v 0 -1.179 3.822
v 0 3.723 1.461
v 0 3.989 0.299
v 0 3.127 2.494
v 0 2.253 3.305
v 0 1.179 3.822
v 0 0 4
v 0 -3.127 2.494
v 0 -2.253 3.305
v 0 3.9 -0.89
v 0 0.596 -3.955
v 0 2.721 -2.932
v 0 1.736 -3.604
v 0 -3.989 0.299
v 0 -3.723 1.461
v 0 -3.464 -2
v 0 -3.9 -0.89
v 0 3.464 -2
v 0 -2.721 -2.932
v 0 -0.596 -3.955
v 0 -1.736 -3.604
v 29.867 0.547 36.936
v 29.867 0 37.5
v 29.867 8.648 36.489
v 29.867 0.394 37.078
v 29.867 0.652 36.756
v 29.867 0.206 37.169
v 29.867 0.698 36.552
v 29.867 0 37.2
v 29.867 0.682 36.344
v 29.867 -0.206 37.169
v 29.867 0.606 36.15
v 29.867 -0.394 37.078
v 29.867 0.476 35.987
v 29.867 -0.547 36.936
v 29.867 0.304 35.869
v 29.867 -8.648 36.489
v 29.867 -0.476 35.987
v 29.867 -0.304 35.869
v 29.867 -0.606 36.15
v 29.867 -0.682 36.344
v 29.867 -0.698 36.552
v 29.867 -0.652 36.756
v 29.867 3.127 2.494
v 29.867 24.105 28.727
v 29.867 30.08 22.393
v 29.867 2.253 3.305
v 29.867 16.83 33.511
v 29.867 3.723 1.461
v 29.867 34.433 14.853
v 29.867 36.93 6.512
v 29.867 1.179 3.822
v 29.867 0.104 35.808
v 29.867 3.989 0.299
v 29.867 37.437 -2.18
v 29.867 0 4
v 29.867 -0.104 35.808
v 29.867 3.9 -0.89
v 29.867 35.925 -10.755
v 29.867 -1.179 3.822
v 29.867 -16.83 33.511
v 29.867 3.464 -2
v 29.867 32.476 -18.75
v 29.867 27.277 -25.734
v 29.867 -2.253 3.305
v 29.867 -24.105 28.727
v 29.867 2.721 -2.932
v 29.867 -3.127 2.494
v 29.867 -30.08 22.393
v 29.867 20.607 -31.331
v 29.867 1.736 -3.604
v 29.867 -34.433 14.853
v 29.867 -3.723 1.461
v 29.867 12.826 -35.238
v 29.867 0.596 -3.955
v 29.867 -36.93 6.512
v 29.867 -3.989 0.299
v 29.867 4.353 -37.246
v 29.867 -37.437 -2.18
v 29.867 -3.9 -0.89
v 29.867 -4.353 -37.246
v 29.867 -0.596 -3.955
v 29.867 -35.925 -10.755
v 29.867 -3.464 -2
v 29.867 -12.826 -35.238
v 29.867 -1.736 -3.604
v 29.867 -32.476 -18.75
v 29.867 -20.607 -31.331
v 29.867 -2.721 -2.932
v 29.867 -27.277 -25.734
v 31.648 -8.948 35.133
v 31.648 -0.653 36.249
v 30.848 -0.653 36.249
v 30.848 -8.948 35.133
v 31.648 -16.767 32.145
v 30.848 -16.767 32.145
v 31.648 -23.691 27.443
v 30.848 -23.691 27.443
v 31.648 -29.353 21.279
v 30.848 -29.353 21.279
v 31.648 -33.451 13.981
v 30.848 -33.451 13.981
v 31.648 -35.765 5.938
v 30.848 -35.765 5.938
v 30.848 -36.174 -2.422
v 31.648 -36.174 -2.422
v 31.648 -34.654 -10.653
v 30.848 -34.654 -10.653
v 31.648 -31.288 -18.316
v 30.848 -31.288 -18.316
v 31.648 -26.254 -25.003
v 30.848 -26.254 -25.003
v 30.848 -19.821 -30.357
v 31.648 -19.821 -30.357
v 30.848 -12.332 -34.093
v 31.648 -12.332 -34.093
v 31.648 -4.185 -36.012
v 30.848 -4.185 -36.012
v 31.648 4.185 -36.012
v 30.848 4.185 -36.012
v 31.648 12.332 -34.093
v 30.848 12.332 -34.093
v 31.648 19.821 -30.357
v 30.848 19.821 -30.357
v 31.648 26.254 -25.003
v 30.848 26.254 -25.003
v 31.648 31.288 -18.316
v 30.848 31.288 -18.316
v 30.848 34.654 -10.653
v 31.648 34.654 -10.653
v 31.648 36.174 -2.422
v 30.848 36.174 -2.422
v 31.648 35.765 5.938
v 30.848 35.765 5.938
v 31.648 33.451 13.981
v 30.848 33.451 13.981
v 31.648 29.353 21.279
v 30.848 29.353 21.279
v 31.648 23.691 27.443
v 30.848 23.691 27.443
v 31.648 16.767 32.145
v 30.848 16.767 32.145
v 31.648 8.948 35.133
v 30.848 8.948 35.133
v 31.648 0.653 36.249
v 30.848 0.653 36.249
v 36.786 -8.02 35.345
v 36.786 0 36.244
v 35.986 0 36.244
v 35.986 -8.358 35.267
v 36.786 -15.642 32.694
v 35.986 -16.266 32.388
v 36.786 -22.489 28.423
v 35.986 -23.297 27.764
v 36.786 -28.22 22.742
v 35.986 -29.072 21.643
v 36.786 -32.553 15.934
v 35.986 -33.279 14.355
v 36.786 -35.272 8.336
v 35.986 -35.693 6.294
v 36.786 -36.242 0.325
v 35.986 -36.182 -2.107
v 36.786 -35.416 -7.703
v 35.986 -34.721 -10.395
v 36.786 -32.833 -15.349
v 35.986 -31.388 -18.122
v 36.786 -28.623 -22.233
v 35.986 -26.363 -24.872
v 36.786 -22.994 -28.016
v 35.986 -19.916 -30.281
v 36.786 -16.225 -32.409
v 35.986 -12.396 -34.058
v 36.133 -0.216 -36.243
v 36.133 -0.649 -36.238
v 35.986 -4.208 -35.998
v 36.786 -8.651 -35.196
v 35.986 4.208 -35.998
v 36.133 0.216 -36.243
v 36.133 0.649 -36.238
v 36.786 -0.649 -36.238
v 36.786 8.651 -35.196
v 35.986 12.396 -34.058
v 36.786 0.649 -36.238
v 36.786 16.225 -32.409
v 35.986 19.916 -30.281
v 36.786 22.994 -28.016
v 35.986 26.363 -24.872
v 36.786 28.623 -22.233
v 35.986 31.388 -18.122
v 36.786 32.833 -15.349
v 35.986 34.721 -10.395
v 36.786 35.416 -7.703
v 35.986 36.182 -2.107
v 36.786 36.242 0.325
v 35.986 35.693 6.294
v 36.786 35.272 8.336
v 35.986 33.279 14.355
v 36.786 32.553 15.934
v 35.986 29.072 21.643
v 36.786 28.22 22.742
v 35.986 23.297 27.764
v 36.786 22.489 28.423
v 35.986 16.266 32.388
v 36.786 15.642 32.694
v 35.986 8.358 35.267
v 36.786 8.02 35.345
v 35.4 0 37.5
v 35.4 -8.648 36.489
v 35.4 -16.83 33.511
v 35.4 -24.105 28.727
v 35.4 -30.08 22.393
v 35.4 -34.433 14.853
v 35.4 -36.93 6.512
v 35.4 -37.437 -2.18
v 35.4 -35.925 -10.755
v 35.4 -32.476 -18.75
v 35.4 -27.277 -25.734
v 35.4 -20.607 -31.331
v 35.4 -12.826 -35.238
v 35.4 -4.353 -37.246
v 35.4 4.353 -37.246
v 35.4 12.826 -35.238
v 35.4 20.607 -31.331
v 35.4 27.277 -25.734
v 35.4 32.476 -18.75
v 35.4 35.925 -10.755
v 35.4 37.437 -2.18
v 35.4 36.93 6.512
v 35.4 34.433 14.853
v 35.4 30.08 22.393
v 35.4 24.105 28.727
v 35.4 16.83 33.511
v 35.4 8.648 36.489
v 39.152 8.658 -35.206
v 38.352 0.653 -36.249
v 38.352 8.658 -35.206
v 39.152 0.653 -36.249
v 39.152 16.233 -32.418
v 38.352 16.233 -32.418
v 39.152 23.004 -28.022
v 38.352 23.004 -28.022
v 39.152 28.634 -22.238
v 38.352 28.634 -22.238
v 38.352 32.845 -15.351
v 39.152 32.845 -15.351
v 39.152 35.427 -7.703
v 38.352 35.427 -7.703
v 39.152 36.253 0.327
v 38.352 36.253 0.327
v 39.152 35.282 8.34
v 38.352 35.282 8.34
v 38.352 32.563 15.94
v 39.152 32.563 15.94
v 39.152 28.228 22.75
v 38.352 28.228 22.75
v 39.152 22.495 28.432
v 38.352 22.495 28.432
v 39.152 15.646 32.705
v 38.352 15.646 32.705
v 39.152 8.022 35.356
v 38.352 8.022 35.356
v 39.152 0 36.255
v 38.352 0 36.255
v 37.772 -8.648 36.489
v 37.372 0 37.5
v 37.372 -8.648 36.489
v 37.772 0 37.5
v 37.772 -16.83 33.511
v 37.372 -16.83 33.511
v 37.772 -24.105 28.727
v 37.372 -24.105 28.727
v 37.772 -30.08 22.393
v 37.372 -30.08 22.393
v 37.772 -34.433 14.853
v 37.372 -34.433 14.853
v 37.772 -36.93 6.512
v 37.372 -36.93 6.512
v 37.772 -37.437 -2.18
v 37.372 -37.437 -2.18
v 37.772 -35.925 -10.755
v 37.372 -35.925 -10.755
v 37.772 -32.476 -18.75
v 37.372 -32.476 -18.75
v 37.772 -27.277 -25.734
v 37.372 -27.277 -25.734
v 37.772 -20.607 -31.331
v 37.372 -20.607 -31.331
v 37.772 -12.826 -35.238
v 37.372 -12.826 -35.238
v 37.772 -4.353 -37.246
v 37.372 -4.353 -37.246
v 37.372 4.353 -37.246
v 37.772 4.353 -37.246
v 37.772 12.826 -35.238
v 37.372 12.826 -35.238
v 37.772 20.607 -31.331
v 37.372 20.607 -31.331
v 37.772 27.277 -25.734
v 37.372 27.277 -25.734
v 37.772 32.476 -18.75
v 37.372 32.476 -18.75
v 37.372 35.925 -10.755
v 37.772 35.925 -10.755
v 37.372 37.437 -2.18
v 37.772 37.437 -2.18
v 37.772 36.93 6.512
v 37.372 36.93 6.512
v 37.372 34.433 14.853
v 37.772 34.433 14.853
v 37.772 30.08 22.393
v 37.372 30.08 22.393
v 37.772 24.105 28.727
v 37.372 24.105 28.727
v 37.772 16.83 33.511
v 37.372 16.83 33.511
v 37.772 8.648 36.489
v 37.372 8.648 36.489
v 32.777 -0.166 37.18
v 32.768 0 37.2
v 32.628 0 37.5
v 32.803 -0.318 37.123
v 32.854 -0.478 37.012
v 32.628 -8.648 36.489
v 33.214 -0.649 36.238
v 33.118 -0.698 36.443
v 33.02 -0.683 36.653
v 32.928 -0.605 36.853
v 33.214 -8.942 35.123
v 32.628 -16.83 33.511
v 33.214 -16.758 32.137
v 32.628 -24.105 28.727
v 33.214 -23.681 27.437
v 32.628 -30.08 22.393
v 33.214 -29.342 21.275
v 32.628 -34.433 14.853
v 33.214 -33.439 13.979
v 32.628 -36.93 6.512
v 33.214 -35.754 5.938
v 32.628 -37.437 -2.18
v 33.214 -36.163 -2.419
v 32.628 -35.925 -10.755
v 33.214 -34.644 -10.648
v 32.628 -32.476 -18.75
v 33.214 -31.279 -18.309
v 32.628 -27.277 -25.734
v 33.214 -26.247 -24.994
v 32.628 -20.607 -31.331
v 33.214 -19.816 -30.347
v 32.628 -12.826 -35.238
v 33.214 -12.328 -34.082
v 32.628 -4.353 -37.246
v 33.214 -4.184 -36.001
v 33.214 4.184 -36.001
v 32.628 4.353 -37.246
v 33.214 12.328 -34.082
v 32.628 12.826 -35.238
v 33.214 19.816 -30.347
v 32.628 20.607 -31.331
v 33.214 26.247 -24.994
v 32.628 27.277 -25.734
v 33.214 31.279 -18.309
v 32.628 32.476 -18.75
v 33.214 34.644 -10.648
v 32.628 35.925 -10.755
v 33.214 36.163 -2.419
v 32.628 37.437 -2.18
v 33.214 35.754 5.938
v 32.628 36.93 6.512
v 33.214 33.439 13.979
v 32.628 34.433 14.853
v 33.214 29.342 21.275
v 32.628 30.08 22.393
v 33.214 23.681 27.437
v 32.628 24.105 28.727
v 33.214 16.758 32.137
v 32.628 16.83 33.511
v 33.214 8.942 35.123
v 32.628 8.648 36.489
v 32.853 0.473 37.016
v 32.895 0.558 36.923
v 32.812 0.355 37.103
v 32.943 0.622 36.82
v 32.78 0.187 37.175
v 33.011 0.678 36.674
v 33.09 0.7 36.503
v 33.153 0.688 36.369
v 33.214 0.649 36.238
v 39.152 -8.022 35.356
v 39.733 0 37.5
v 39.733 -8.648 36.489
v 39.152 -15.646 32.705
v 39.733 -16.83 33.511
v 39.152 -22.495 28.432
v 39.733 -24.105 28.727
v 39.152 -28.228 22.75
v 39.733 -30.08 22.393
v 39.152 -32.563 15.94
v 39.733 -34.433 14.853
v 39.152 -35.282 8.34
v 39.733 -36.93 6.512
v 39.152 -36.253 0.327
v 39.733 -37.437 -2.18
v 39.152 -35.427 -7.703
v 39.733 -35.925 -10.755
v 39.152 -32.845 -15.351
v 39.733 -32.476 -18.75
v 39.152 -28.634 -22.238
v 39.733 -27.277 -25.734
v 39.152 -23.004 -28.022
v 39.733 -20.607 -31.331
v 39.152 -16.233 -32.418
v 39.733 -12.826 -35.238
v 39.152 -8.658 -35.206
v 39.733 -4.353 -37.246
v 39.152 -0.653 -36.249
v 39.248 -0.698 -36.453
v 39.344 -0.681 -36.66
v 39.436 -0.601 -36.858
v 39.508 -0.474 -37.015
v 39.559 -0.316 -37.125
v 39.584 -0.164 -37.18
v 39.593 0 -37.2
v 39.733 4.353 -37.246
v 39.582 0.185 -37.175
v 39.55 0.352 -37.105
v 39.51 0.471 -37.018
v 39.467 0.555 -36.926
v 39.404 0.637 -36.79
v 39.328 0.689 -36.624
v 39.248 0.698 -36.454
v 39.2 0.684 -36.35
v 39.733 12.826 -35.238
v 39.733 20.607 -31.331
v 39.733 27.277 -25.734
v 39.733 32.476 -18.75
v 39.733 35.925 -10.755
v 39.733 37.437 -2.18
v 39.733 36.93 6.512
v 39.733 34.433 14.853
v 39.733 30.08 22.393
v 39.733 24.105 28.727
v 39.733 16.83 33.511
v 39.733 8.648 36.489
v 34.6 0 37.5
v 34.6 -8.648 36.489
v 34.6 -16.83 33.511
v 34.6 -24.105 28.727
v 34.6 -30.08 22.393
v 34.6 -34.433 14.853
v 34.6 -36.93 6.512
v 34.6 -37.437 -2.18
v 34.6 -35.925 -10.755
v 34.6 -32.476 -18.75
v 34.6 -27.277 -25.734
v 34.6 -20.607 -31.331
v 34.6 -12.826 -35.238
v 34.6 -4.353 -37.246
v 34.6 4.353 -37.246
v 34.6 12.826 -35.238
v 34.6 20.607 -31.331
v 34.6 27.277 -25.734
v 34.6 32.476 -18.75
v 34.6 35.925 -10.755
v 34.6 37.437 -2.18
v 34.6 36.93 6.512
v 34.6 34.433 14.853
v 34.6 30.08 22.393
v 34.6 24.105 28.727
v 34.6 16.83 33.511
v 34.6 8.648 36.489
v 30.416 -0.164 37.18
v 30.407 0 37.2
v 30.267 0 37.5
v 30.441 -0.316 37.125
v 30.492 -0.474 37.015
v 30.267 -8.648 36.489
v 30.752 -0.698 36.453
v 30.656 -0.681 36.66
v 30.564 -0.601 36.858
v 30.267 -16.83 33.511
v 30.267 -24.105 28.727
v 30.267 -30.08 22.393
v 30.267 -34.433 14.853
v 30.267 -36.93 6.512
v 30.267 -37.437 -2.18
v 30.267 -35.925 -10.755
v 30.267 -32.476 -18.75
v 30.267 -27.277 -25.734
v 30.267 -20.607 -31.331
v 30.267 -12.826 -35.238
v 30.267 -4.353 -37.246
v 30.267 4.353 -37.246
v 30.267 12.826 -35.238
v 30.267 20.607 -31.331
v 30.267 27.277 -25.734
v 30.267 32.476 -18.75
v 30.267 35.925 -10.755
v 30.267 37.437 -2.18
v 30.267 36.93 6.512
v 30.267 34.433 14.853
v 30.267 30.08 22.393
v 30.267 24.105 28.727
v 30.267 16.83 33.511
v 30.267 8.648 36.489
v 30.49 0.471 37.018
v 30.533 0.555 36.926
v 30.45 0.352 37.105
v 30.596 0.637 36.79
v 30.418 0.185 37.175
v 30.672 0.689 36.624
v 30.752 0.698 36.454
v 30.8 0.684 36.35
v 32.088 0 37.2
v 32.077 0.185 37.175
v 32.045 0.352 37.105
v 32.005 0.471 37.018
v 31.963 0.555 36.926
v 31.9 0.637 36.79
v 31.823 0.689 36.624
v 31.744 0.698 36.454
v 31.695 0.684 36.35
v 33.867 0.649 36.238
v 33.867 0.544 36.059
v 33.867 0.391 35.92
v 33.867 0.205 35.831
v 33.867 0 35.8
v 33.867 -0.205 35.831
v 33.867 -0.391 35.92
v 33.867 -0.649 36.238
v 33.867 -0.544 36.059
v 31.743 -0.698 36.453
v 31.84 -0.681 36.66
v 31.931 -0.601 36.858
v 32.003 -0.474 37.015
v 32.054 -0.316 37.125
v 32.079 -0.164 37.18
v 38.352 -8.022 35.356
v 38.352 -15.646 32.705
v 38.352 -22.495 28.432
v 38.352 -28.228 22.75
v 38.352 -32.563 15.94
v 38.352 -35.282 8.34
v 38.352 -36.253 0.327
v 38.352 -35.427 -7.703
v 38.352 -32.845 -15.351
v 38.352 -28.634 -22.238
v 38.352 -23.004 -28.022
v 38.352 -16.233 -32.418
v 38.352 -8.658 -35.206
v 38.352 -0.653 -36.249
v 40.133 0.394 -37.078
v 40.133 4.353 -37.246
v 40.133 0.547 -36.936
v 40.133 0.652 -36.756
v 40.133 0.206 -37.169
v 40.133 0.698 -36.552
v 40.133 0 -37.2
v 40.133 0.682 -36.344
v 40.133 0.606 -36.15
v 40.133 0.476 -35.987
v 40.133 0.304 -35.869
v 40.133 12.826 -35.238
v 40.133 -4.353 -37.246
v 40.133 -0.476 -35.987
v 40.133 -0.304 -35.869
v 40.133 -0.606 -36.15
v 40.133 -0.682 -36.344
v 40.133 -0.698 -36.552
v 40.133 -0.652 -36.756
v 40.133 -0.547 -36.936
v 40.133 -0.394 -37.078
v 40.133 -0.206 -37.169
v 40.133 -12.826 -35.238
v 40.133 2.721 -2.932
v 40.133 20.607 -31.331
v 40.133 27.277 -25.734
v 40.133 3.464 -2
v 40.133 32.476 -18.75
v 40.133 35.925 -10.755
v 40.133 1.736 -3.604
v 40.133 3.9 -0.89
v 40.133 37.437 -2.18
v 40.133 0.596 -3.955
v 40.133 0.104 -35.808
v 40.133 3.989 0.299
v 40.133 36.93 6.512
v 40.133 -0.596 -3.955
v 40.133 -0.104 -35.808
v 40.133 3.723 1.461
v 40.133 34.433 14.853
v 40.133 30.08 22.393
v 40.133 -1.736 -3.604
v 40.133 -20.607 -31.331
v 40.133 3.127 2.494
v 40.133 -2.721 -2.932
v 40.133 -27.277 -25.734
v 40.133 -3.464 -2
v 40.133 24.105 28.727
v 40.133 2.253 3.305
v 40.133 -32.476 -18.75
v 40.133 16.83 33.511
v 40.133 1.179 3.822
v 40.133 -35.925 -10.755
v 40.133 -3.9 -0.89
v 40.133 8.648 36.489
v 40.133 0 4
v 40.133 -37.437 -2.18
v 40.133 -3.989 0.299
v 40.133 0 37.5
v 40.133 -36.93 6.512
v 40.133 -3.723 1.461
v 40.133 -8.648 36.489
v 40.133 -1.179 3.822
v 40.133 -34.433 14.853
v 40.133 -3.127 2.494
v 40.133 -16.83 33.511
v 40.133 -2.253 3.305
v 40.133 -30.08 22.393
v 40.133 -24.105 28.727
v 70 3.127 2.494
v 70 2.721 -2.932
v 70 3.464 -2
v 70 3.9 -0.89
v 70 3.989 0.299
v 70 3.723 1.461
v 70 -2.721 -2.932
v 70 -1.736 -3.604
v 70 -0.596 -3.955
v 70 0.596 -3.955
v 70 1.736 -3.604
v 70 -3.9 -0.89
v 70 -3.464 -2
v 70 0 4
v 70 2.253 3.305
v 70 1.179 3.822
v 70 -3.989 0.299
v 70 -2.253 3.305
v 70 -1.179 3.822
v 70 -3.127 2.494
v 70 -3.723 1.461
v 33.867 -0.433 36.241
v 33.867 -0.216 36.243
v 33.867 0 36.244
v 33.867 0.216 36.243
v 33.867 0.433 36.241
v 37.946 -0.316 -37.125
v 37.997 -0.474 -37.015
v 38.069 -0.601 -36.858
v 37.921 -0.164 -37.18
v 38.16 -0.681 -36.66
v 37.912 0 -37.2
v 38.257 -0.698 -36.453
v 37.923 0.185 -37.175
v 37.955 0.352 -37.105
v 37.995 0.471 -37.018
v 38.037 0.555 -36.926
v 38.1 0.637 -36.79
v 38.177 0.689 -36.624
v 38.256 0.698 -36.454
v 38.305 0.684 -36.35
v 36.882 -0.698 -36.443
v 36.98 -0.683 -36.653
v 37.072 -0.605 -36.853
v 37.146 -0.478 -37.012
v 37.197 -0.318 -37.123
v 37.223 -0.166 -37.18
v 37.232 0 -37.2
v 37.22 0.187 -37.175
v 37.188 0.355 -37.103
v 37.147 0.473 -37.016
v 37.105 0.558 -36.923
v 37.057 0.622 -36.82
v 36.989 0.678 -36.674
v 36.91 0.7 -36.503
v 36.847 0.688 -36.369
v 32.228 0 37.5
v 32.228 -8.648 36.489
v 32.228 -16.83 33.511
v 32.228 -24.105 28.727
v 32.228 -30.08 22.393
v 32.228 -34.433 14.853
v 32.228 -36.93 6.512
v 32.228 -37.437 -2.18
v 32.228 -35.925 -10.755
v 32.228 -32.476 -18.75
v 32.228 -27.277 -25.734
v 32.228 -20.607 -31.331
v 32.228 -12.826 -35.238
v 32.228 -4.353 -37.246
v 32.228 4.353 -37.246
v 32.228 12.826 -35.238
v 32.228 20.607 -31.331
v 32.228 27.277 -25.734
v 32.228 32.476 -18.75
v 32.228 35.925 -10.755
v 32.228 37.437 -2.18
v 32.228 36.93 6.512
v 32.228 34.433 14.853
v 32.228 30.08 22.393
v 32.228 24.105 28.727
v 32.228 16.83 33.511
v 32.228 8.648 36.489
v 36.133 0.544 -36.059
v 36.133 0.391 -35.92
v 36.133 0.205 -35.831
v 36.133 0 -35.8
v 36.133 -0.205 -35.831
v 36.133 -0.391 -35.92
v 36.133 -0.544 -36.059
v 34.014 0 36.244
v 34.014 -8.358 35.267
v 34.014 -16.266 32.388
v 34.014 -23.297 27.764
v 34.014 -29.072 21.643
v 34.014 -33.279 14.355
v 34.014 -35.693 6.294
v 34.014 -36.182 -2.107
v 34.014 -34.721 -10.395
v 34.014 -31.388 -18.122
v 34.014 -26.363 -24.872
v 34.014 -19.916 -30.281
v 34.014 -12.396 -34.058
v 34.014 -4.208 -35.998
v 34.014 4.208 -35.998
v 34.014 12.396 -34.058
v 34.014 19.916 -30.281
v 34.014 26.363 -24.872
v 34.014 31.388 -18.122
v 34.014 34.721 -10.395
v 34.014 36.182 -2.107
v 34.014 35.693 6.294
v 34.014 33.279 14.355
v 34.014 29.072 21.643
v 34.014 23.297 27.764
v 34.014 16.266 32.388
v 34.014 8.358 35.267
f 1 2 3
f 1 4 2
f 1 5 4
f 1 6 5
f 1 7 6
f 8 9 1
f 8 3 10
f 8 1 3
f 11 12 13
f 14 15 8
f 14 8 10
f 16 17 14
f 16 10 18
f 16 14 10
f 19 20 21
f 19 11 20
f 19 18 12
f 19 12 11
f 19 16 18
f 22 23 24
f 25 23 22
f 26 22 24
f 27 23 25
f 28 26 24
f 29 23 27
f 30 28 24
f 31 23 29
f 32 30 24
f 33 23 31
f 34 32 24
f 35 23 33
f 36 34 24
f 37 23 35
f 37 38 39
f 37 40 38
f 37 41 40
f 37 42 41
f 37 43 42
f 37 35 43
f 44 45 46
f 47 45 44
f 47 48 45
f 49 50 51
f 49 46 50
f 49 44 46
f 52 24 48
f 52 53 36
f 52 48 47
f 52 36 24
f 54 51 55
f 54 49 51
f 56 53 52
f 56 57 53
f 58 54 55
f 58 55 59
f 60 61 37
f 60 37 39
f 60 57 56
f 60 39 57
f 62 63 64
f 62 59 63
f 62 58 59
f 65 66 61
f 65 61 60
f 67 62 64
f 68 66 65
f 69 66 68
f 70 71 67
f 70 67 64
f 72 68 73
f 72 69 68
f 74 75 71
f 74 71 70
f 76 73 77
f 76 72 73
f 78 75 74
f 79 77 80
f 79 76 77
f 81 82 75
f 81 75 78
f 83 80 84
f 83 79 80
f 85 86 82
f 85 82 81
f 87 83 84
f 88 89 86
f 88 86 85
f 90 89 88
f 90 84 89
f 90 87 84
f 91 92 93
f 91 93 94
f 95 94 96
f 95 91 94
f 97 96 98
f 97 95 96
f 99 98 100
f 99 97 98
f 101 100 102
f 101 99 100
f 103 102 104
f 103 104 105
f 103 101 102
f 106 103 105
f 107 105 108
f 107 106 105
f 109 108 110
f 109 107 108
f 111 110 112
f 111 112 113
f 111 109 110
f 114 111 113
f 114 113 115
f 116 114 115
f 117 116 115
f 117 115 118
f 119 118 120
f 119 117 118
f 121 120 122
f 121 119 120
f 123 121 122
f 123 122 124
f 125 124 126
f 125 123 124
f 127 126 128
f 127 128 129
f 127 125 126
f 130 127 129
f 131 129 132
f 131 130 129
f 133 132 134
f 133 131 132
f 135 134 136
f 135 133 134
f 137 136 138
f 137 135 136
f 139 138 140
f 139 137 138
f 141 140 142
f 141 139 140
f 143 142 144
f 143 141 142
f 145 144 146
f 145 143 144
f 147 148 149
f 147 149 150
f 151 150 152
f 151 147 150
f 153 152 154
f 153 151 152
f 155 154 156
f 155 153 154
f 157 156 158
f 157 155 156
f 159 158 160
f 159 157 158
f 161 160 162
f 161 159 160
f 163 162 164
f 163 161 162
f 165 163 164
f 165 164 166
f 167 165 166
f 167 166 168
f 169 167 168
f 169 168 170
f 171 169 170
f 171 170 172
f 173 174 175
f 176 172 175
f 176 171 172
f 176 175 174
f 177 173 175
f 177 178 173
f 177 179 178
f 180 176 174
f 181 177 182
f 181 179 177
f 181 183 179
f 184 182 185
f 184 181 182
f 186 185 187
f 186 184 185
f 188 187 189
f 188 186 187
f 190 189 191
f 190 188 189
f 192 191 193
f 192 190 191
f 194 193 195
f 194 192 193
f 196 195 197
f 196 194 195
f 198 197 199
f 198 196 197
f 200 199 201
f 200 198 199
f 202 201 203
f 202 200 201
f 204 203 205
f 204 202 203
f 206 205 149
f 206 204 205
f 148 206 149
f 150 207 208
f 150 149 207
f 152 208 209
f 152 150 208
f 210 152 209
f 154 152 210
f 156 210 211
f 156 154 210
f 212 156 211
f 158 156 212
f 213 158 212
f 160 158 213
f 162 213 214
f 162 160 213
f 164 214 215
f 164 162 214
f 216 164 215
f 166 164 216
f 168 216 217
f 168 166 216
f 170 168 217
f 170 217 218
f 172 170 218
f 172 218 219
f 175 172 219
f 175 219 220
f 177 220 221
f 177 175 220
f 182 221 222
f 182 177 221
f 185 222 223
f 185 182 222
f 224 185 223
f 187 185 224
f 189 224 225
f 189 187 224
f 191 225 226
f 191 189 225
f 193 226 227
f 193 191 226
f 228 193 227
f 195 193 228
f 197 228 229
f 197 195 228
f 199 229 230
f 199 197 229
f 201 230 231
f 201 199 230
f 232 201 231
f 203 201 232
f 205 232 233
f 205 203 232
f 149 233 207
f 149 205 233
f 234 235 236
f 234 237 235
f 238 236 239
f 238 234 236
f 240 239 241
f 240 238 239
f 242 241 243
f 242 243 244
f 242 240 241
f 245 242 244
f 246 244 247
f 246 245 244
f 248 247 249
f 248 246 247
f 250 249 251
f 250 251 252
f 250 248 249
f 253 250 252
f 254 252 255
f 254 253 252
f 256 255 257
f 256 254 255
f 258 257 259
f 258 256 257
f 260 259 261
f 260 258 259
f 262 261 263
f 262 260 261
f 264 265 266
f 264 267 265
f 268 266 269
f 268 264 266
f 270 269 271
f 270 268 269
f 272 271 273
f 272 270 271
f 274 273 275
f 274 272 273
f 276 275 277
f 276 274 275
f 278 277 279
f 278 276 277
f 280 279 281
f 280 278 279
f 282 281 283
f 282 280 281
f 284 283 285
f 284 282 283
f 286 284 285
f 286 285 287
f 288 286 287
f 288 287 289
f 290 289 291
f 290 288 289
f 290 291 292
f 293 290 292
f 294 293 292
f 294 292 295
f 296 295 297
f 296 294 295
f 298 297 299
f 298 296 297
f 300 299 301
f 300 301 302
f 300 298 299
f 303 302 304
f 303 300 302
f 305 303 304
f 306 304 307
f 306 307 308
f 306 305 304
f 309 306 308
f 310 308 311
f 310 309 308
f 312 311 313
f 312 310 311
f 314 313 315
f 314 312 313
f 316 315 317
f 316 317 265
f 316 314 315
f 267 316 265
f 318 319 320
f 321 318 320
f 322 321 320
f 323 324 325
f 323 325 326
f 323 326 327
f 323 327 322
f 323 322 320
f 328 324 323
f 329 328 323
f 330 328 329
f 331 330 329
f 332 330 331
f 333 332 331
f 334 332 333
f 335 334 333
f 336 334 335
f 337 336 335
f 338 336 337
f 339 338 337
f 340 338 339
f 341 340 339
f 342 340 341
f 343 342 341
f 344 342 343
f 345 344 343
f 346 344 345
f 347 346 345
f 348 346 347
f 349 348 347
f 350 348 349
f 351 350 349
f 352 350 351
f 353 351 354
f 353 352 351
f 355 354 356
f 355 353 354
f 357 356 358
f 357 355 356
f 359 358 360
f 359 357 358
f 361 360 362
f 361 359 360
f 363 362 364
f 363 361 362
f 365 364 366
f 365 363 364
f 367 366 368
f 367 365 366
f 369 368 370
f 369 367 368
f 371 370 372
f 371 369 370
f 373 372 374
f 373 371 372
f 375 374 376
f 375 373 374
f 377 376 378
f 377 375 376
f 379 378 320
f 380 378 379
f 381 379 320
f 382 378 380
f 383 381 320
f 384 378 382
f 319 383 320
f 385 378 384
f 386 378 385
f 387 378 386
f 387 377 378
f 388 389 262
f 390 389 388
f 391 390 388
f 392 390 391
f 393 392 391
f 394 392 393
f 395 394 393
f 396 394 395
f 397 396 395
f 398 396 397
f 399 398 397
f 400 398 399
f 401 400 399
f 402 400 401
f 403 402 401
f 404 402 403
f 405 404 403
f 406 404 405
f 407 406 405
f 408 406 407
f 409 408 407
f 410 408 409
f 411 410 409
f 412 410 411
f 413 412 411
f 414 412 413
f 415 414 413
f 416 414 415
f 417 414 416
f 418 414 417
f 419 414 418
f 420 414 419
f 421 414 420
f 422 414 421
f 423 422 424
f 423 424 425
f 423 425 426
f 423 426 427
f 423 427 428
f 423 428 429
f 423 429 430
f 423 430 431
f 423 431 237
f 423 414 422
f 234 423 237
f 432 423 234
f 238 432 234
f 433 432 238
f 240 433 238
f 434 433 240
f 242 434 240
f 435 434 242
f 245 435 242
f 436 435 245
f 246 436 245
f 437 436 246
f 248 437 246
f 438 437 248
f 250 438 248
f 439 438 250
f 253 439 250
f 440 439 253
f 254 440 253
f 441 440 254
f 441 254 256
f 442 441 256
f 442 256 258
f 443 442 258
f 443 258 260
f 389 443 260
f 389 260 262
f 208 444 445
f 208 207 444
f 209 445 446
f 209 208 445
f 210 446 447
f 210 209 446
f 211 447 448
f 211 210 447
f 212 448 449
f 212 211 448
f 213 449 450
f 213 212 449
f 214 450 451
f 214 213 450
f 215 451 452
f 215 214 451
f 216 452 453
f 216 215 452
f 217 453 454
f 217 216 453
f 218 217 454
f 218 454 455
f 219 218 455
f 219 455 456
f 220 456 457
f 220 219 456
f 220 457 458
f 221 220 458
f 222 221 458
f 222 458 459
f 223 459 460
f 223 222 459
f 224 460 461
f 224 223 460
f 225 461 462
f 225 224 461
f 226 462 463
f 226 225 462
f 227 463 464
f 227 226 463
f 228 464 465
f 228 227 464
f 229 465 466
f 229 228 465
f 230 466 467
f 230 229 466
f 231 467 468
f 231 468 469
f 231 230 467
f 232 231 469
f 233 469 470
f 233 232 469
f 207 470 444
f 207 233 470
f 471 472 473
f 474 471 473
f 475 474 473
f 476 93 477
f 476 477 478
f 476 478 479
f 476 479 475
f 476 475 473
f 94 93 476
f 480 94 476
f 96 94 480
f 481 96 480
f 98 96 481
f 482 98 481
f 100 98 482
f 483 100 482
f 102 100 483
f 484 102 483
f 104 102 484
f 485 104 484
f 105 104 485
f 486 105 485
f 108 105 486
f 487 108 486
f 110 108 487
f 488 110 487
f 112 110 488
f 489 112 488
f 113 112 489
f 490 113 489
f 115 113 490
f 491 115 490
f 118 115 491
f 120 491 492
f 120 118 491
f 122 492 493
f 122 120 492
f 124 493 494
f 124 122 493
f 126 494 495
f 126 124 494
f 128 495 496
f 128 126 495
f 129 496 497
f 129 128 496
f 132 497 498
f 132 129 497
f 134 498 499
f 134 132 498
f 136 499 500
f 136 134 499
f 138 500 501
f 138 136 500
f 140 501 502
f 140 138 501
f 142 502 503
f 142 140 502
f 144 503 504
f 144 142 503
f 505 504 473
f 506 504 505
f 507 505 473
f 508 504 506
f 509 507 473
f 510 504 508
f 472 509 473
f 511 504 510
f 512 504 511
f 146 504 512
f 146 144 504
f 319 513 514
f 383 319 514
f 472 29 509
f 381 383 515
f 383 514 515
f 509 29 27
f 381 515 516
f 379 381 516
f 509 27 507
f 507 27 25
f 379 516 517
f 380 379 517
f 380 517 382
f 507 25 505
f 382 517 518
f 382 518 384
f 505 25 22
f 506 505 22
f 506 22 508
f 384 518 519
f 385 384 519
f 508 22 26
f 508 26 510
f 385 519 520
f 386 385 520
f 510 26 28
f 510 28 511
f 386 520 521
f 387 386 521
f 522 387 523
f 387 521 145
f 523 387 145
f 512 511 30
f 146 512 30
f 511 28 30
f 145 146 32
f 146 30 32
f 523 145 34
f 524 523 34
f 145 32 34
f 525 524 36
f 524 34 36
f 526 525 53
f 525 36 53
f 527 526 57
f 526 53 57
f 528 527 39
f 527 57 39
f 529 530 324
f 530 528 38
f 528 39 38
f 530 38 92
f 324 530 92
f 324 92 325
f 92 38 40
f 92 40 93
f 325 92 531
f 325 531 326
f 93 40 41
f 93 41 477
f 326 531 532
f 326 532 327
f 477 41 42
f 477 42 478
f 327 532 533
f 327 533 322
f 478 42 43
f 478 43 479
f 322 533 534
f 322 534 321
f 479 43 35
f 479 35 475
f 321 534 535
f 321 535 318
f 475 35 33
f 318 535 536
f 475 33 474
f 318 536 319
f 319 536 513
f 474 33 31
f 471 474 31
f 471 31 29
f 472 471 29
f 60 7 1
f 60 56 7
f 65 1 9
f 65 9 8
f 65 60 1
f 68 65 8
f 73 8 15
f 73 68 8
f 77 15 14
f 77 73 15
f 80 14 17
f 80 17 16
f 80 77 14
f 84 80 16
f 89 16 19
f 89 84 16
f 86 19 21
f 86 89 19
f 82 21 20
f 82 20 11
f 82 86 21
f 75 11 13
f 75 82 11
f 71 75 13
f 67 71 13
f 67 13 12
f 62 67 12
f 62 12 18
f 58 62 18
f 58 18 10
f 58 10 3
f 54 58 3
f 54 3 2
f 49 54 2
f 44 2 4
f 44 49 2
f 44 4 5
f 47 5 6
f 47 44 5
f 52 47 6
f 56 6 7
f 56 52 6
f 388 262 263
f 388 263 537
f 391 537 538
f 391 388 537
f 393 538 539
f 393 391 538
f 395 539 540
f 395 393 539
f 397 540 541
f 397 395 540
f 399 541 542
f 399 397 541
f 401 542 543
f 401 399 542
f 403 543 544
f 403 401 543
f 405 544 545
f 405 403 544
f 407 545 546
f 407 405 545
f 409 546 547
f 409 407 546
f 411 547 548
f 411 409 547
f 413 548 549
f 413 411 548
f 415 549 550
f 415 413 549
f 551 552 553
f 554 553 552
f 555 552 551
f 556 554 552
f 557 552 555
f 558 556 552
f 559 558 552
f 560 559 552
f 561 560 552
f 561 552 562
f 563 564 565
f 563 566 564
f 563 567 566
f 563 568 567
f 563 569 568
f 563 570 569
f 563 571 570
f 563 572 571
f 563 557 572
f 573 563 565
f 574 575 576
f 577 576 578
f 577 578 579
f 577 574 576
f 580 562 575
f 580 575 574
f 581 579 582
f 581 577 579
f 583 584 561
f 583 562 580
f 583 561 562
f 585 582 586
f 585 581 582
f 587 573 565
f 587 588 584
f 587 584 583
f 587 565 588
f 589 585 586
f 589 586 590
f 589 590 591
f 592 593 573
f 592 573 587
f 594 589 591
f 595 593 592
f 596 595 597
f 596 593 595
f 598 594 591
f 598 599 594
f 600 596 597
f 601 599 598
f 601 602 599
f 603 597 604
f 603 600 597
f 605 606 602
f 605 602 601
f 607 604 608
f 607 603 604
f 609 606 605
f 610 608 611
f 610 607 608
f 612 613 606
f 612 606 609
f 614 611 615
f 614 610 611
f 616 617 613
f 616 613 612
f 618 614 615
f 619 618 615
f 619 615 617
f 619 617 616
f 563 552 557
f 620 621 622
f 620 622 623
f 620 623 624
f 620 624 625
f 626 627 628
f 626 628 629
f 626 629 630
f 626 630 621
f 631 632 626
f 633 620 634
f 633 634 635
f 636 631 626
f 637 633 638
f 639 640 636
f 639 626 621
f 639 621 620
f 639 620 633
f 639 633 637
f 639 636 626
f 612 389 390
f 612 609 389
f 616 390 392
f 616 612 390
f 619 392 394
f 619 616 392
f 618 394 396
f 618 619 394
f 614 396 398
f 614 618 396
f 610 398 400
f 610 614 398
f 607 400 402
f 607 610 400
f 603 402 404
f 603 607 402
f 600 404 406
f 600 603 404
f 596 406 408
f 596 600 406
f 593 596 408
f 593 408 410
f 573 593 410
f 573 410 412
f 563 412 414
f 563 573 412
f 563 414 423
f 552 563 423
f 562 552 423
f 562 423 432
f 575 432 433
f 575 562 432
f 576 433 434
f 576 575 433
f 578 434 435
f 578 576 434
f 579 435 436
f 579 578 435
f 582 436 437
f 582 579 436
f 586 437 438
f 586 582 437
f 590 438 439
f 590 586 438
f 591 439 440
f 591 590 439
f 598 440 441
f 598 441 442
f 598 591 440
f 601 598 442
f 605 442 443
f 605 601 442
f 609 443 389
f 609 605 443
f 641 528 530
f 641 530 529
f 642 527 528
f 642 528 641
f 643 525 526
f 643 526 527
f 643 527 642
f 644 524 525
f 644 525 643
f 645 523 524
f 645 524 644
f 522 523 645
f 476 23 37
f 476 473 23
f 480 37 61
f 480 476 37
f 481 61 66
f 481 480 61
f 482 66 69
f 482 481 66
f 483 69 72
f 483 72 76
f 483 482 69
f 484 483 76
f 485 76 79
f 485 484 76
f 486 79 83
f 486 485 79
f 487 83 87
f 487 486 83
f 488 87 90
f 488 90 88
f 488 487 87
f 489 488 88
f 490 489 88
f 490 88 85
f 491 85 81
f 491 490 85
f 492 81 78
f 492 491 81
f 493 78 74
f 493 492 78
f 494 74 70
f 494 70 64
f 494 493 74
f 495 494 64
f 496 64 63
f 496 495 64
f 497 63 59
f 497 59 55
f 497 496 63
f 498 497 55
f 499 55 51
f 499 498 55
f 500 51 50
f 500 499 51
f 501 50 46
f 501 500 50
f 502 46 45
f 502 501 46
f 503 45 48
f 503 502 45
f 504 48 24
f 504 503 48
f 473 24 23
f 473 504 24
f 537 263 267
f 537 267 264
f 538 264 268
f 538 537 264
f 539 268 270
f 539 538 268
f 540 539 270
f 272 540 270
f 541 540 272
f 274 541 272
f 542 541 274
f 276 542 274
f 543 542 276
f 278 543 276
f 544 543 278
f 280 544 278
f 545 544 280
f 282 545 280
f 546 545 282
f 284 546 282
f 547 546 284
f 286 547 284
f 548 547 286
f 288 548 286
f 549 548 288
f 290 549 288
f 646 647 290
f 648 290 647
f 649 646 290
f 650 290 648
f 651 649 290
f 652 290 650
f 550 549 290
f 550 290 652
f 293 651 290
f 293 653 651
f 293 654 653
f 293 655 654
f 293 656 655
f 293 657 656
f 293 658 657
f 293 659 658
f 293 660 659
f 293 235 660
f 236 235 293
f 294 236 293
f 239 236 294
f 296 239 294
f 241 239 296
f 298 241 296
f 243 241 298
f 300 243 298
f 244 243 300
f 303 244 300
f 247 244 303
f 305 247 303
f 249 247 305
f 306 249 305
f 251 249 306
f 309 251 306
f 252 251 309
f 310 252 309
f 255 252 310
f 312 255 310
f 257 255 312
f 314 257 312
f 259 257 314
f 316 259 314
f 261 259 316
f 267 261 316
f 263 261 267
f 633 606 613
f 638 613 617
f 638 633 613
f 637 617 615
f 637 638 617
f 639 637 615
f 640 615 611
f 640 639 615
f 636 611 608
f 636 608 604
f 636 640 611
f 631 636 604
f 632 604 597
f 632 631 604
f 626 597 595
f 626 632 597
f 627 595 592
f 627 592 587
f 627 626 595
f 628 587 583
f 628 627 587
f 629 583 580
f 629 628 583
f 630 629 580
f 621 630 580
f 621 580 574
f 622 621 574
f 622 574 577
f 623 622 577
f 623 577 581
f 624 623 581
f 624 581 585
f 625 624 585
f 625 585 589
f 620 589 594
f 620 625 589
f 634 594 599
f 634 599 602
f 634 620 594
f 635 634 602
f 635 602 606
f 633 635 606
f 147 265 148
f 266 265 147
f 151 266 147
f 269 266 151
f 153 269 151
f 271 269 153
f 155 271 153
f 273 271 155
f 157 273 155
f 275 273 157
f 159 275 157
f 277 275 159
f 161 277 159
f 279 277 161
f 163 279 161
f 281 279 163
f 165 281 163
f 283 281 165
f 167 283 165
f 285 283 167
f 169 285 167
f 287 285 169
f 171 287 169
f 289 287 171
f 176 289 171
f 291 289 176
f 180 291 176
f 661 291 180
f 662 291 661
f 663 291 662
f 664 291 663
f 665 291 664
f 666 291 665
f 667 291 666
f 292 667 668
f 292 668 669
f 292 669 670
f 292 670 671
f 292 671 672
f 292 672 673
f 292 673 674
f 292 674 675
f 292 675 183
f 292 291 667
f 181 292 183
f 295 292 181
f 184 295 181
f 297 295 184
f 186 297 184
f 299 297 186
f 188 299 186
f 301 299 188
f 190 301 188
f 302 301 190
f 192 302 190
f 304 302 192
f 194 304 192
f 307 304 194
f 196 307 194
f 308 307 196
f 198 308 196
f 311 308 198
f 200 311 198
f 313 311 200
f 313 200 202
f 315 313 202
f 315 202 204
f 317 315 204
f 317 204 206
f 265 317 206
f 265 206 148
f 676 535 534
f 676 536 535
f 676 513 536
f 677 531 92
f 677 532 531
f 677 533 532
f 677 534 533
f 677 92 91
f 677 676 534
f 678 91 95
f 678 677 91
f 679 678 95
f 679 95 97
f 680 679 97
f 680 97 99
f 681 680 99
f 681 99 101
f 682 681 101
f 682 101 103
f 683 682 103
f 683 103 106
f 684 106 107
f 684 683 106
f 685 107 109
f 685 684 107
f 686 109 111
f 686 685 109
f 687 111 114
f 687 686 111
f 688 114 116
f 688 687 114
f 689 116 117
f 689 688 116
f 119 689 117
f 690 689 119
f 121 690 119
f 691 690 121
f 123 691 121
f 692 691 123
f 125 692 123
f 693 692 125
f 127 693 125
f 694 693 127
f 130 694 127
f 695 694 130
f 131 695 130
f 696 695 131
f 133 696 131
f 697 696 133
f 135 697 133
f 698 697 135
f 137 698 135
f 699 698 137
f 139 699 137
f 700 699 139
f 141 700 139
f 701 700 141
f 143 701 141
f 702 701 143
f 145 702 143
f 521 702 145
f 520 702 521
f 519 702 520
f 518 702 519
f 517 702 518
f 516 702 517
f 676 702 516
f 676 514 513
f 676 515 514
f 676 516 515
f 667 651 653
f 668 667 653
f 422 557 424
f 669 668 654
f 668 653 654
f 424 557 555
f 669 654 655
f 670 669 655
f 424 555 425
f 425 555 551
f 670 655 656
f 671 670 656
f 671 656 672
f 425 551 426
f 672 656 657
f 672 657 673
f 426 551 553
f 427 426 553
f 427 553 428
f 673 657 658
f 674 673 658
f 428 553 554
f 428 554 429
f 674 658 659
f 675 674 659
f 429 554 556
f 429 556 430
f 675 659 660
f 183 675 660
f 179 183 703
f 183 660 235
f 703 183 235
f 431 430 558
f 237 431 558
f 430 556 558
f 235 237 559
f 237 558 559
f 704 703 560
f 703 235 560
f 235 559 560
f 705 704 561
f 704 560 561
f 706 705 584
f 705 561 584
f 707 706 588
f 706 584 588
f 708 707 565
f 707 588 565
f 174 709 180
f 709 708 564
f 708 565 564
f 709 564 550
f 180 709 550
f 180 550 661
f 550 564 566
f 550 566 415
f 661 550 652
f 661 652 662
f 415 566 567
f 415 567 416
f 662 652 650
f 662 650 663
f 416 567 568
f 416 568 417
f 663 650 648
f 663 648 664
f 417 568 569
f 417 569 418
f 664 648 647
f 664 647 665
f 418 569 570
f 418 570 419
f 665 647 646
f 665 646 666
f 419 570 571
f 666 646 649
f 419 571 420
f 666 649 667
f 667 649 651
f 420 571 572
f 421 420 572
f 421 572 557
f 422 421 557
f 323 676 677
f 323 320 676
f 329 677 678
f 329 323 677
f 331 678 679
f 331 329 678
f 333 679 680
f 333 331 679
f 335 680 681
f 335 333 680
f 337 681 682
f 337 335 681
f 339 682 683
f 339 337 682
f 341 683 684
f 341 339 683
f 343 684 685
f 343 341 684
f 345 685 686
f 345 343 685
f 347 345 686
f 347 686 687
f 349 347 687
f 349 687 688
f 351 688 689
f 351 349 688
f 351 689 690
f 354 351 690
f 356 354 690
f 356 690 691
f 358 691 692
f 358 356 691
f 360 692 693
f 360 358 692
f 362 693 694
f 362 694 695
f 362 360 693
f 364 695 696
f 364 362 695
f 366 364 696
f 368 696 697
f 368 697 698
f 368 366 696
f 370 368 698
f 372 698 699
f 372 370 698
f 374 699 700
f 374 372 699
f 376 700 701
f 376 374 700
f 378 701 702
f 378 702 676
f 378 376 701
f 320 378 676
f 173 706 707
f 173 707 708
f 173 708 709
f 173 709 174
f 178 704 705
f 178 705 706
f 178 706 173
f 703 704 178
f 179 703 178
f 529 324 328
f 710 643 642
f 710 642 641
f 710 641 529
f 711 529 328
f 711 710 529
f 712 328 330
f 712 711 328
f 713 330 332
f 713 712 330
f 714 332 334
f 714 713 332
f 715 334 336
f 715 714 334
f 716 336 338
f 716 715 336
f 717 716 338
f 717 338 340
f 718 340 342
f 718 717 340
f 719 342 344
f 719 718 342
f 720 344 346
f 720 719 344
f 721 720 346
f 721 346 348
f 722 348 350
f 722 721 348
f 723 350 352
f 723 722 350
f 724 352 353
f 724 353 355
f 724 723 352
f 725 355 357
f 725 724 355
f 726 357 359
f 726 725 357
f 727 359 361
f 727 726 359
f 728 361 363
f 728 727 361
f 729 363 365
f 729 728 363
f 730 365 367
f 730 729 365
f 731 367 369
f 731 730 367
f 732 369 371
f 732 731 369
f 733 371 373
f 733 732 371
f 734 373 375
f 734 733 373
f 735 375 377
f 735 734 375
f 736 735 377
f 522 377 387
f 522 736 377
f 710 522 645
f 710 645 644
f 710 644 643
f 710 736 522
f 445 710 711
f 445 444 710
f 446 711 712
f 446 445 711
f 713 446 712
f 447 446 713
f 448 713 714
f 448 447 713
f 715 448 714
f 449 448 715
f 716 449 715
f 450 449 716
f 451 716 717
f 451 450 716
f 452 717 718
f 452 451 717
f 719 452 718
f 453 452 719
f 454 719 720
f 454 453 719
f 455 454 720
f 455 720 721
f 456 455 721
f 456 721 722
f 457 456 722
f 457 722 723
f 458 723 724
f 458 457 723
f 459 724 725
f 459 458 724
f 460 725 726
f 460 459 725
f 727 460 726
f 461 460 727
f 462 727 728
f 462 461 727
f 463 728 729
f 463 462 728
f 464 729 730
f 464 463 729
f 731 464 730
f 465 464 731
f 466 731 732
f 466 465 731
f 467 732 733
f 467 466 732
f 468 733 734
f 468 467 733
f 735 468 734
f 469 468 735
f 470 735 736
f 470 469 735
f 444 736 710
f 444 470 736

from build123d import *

# Parameters (mm, degrees)
SKETCH3_R          = 0.7
CUT_EXTRUDE1_DEPTH = 4
SKETCH2_R          = 0.7
CUT_EXTRUDE2_DEPTH = 4


with BuildPart() as part:
    # Sketch1 → Revolve1 (revolve)
    with BuildSketch(Plane.XY, mode=Mode.PRIVATE) as revolve1_sk:
        Polygon((35.4, 37.5), (35.98589676, 36.243540344), (36.78589676, 36.243540344), (37.37179352, 37.5), (37.77179352, 37.5), (38.352443595, 36.254791895), (39.152443595, 36.254791895), (39.73309367, 37.5), (40.13309367, 37.5), (40.13309367, 4), (70, 4), (70, 0), (0, 0), (0, 4), (29.86690633, 4), (29.86690633, 37.5), (30.26690633, 37.5), (30.847556405, 36.254791895), (31.647556405, 36.254791895), (32.22820648, 37.5), (32.62820648, 37.5), (33.21410324, 36.243540344), (34.01410324, 36.243540344), (34.6, 37.5), align=None)
    revolve(revolve1_sk.sketch.rotate(Axis((0, 0, 0), (1, 0, 0)), 90), axis=Axis((0, 0, 0), (1, 0, 0)))

    # Sketch3 → Cut-Extrude1 (cut)
    with BuildSketch(Plane(origin=(40.13309367, 0, 0), x_dir=(0, 0, -1), z_dir=(1, 0, 0))):
        with Locations((36.5, 0)):
            Circle(SKETCH3_R)
    extrude(amount=-CUT_EXTRUDE1_DEPTH, mode=Mode.SUBTRACT)

    # Sketch2 → Cut-Extrude2 (cut)
    with BuildSketch(Plane.ZY.offset(-29.86690633)):
        with Locations((36.5, 0)):
            Circle(SKETCH2_R)
    extrude(amount=-CUT_EXTRUDE2_DEPTH, mode=Mode.SUBTRACT)


solid = part.part
